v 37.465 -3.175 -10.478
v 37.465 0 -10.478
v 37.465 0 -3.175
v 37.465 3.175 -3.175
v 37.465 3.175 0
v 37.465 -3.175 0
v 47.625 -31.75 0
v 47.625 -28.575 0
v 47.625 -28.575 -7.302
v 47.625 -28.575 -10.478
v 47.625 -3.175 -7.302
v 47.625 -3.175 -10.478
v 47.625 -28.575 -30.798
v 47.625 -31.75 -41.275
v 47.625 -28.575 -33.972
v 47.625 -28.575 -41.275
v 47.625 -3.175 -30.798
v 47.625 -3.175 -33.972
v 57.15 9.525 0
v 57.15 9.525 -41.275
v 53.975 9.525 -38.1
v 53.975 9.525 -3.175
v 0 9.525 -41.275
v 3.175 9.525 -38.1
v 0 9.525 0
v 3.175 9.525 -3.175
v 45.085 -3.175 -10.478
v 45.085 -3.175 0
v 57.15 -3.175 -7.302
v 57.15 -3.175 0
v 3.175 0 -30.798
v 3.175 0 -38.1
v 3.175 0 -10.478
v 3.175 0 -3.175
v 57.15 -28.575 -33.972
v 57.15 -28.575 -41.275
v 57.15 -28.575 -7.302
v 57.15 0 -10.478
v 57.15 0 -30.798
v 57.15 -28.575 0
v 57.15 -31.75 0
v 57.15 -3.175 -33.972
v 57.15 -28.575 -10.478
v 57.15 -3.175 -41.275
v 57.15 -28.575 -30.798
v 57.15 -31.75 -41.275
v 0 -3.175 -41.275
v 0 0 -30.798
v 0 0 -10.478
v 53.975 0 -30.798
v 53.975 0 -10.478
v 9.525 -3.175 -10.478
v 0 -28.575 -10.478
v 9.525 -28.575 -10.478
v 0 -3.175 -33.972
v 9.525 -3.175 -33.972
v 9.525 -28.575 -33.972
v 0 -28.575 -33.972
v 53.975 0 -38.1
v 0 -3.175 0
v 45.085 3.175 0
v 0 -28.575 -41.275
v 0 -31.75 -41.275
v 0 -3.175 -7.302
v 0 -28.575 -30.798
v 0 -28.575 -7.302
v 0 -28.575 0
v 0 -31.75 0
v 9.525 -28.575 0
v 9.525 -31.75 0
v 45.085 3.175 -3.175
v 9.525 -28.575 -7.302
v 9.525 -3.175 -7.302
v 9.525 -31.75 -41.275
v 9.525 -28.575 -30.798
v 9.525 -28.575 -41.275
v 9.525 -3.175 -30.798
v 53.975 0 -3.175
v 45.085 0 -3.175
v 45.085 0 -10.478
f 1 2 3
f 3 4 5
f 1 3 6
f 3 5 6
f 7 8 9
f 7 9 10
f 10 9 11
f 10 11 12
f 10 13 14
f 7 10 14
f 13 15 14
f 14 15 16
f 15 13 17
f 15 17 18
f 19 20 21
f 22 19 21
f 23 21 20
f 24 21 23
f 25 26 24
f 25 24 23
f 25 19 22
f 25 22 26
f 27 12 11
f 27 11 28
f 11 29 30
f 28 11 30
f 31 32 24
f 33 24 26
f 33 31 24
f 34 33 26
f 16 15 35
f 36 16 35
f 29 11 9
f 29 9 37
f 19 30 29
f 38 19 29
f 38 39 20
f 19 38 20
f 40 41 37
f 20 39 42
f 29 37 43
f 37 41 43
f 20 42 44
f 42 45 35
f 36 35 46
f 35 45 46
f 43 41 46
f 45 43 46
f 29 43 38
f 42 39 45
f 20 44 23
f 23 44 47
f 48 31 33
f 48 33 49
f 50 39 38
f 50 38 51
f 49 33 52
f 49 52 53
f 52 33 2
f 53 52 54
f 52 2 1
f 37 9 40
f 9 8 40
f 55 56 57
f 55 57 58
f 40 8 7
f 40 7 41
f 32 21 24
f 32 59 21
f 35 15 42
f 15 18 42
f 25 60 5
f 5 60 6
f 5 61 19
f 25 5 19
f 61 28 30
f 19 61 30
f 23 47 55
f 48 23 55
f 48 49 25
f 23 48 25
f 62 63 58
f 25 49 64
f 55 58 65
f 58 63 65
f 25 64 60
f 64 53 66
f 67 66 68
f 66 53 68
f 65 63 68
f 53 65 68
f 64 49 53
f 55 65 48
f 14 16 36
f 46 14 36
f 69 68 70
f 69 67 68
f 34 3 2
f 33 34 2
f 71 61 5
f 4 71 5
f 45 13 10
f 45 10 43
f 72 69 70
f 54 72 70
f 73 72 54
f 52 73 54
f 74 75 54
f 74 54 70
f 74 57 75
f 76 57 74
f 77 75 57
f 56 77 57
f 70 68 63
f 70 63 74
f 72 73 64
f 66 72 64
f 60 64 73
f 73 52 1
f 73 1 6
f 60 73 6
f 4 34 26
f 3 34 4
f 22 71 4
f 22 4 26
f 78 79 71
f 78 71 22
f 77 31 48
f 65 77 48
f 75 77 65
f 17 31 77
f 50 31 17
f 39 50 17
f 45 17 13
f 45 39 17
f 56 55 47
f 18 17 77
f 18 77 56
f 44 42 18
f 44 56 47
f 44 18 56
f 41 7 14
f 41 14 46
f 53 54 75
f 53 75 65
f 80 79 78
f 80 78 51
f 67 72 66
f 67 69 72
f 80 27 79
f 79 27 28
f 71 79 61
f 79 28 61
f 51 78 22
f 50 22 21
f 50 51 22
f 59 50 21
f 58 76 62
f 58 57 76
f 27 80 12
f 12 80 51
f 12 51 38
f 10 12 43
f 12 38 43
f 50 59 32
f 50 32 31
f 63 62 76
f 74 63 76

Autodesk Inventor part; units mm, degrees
ref_plane "YZ Plane" through (0, 0, 0) normal (1, 0, 0) x (0, 1, 0)
ref_plane "XZ Plane" through (0, 0, 0) normal (0, 1, 0) x (-1, 0, 0)
ref_plane "XY Plane" through (0, 0, 0) normal (0, 0, 1) x (1, 0, 0)
sketch "Sketch1" plane through (0, 0, 0) normal (0, 1, 0) x (-1, 0, 0)
  line L0 (0, 0) -> (-57.15, 0)
  line L1 (-57.15, 0) -> (-57.15, -41.275)
  line L2 (-57.15, -41.275) -> (0, -41.275)
  line L3 (0, -41.275) -> (0, 0)
  line L4 (-3.175, -3.175) -> (-53.975, -3.175)
  line L5 (-53.975, -3.175) -> (-53.975, -38.1)
  line L6 (-53.975, -38.1) -> (-3.175, -38.1)
  line L7 (-3.175, -38.1) -> (-3.175, -3.175)
  line L8 (0, -20.6375) -> (-57.15, -20.6375) construction
  line L9 (-28.575, 0) -> (-28.575, -41.275) construction
  point P0 (-3.175, -20.6375)
  dimension "d0" = 57.15
  dimension "d1" = 41.275
  dimension "d2" = 3.175
  dimension "d3" = 3.175
extrude "Extrusion4" add sketch "Sketch1" along normal blind 9.525
sketch "Sketch4" plane through (57.15, 0, 0) normal (1, 0, 0) x (0, 0, -1)
  line L0 (0, 0) -> (0, 9.525) projected
  line L1 (0, 0) -> (10.4775, 0)
  line L2 (10.4775, 0) -> (10.4775, -3.175)
  line L3 (10.4775, -3.175) -> (0, -3.175)
  line L4 (0, -3.175) -> (0, 0)
  line L5 (41.275, 0) -> (41.275, 9.525) projected
  line L6 (41.275, 0) -> (30.7975, 0)
  line L7 (30.7975, 0) -> (30.7975, -3.175)
  line L8 (30.7975, -3.175) -> (41.275, -3.175)
  line L9 (41.275, -3.175) -> (41.275, 0)
  line L10 (3.175, 9.525) -> (38.1, 9.525) construction
  line L11 (20.6375, 9.525) -> (20.6375, 0) construction
  line L12 (3.175, 0) -> (38.1, 0) construction
  dimension "d25" = 20.32
  dimension "d26" = 3.175
extrude "Extrusion5" add sketch "Sketch4" against normal up to surface (57.15 mm away)
sketch "Sketch5" plane through (0, 9.525, 0) normal (0, 0, 1) x (1, 0, 0)
  line L0 (57.15, -12.7) -> (0, -12.7) projected
  line L1 (37.465, -12.7) -> (45.085, -12.7)
  line L2 (45.085, -12.7) -> (45.085, -6.35)
  line L3 (45.085, -6.35) -> (37.465, -6.35)
  line L4 (37.465, -6.35) -> (37.465, -12.7)
  line L5 (53.975, -9.525) -> (53.975, 0) projected
  line L6 (0, -12.7) -> (0, 0) projected
  line L7 (3.175, -9.525) -> (3.175, 0) projected
  point P0 (0, -9.525)
  dimension "d29" = 16.51
  dimension "d31" = 41.91
  dimension "d32" = 6.35
extrude "Extrusion6" cut sketch "Sketch5" against normal up to surface (10.4775 mm away)
sketch "Sketch6" plane through (57.15, -3.175, -41.275) normal (0, -1, 0) x (1, 0, 0)
  point P0 (-57.15, 41.275)
sketch "Sketch7" plane through (57.15, -3.175, -41.275) normal (0, -1, 0) x (1, 0, 0)
  line L0 (-3.175, 10.4775) -> (0, 10.4775) projected
  line L1 (0, 10.4775) -> (-9.525, 10.4775)
  line L2 (-9.525, 10.4775) -> (-9.525, 7.3025)
  line L3 (-9.525, 7.3025) -> (0, 7.3025)
  line L4 (0, 7.3025) -> (0, 10.4775)
  line L5 (0, 41.275) -> (0, 0) construction
  line L6 (0, 20.6375) -> (-57.15, 20.6375) construction
  line L7 (-57.15, 0) -> (-57.15, 41.275) construction
  line L8 (0, 30.7975) -> (-9.525, 30.7975)
  line L9 (-9.525, 30.7975) -> (-9.525, 33.9725)
  line L10 (-9.525, 33.9725) -> (0, 33.9725)
  line L11 (0, 33.9725) -> (0, 30.7975)
  line L12 (0, 0) -> (-57.15, 0) construction
  line L13 (-28.575, 0) -> (-28.575, 41.275) construction
  line L14 (-19.685, 41.275) -> (-57.15, 41.275) construction
  line L15 (-57.15, 10.4775) -> (-47.625, 10.4775)
  line L16 (-47.625, 10.4775) -> (-47.625, 7.3025)
  line L17 (-47.625, 7.3025) -> (-57.15, 7.3025)
  line L18 (-57.15, 7.3025) -> (-57.15, 10.4775)
  line L19 (-57.15, 41.275) -> (-57.15, 0) construction
  line L20 (-57.15, 30.7975) -> (-47.625, 30.7975)
  line L21 (-47.625, 30.7975) -> (-47.625, 33.9725)
  line L22 (-47.625, 33.9725) -> (-57.15, 33.9725)
  line L23 (-57.15, 33.9725) -> (-57.15, 30.7975)
  dimension "d35" = 3.175
  dimension "d36" = 9.525
extrude "Extrusion7" add sketch "Sketch7" along normal blind 28.575
sketch "Sketch8" plane through (0, -3.175, -7.3025) normal (0, 0, 1) x (1, 0, 0)
  point P0 (0, 3.175)
sketch "Sketch9" plane through (0, 9.525, 0) normal (0, 0, 1) x (1, 0, 0)
  line L0 (0, -12.7) -> (0, -41.275) projected
  line L1 (9.525, -12.7) -> (9.525, -41.275) projected
  line L2 (0, -41.275) -> (9.525, -41.275)
  line L3 (9.525, -41.275) -> (9.525, -38.1)
  line L4 (9.525, -38.1) -> (0, -38.1)
  line L5 (0, -38.1) -> (0, -41.275)
  line L6 (57.15, -41.275) -> (57.15, -9.525) projected
  line L7 (47.625, -12.7) -> (47.625, -41.275) projected
  line L8 (57.15, -41.275) -> (47.625, -41.275)
  line L9 (47.625, -41.275) -> (47.625, -38.1)
  line L10 (47.625, -38.1) -> (57.15, -38.1)
  line L11 (57.15, -38.1) -> (57.15, -41.275)
  point P0 (0, -9.525)
  point P1 (0, -38.1)
  dimension "d39" = 3.175
extrude "Extrusion8" add sketch "Sketch9" against normal up to surface (41.275 mm away)
properties part number "gcs microhard"
